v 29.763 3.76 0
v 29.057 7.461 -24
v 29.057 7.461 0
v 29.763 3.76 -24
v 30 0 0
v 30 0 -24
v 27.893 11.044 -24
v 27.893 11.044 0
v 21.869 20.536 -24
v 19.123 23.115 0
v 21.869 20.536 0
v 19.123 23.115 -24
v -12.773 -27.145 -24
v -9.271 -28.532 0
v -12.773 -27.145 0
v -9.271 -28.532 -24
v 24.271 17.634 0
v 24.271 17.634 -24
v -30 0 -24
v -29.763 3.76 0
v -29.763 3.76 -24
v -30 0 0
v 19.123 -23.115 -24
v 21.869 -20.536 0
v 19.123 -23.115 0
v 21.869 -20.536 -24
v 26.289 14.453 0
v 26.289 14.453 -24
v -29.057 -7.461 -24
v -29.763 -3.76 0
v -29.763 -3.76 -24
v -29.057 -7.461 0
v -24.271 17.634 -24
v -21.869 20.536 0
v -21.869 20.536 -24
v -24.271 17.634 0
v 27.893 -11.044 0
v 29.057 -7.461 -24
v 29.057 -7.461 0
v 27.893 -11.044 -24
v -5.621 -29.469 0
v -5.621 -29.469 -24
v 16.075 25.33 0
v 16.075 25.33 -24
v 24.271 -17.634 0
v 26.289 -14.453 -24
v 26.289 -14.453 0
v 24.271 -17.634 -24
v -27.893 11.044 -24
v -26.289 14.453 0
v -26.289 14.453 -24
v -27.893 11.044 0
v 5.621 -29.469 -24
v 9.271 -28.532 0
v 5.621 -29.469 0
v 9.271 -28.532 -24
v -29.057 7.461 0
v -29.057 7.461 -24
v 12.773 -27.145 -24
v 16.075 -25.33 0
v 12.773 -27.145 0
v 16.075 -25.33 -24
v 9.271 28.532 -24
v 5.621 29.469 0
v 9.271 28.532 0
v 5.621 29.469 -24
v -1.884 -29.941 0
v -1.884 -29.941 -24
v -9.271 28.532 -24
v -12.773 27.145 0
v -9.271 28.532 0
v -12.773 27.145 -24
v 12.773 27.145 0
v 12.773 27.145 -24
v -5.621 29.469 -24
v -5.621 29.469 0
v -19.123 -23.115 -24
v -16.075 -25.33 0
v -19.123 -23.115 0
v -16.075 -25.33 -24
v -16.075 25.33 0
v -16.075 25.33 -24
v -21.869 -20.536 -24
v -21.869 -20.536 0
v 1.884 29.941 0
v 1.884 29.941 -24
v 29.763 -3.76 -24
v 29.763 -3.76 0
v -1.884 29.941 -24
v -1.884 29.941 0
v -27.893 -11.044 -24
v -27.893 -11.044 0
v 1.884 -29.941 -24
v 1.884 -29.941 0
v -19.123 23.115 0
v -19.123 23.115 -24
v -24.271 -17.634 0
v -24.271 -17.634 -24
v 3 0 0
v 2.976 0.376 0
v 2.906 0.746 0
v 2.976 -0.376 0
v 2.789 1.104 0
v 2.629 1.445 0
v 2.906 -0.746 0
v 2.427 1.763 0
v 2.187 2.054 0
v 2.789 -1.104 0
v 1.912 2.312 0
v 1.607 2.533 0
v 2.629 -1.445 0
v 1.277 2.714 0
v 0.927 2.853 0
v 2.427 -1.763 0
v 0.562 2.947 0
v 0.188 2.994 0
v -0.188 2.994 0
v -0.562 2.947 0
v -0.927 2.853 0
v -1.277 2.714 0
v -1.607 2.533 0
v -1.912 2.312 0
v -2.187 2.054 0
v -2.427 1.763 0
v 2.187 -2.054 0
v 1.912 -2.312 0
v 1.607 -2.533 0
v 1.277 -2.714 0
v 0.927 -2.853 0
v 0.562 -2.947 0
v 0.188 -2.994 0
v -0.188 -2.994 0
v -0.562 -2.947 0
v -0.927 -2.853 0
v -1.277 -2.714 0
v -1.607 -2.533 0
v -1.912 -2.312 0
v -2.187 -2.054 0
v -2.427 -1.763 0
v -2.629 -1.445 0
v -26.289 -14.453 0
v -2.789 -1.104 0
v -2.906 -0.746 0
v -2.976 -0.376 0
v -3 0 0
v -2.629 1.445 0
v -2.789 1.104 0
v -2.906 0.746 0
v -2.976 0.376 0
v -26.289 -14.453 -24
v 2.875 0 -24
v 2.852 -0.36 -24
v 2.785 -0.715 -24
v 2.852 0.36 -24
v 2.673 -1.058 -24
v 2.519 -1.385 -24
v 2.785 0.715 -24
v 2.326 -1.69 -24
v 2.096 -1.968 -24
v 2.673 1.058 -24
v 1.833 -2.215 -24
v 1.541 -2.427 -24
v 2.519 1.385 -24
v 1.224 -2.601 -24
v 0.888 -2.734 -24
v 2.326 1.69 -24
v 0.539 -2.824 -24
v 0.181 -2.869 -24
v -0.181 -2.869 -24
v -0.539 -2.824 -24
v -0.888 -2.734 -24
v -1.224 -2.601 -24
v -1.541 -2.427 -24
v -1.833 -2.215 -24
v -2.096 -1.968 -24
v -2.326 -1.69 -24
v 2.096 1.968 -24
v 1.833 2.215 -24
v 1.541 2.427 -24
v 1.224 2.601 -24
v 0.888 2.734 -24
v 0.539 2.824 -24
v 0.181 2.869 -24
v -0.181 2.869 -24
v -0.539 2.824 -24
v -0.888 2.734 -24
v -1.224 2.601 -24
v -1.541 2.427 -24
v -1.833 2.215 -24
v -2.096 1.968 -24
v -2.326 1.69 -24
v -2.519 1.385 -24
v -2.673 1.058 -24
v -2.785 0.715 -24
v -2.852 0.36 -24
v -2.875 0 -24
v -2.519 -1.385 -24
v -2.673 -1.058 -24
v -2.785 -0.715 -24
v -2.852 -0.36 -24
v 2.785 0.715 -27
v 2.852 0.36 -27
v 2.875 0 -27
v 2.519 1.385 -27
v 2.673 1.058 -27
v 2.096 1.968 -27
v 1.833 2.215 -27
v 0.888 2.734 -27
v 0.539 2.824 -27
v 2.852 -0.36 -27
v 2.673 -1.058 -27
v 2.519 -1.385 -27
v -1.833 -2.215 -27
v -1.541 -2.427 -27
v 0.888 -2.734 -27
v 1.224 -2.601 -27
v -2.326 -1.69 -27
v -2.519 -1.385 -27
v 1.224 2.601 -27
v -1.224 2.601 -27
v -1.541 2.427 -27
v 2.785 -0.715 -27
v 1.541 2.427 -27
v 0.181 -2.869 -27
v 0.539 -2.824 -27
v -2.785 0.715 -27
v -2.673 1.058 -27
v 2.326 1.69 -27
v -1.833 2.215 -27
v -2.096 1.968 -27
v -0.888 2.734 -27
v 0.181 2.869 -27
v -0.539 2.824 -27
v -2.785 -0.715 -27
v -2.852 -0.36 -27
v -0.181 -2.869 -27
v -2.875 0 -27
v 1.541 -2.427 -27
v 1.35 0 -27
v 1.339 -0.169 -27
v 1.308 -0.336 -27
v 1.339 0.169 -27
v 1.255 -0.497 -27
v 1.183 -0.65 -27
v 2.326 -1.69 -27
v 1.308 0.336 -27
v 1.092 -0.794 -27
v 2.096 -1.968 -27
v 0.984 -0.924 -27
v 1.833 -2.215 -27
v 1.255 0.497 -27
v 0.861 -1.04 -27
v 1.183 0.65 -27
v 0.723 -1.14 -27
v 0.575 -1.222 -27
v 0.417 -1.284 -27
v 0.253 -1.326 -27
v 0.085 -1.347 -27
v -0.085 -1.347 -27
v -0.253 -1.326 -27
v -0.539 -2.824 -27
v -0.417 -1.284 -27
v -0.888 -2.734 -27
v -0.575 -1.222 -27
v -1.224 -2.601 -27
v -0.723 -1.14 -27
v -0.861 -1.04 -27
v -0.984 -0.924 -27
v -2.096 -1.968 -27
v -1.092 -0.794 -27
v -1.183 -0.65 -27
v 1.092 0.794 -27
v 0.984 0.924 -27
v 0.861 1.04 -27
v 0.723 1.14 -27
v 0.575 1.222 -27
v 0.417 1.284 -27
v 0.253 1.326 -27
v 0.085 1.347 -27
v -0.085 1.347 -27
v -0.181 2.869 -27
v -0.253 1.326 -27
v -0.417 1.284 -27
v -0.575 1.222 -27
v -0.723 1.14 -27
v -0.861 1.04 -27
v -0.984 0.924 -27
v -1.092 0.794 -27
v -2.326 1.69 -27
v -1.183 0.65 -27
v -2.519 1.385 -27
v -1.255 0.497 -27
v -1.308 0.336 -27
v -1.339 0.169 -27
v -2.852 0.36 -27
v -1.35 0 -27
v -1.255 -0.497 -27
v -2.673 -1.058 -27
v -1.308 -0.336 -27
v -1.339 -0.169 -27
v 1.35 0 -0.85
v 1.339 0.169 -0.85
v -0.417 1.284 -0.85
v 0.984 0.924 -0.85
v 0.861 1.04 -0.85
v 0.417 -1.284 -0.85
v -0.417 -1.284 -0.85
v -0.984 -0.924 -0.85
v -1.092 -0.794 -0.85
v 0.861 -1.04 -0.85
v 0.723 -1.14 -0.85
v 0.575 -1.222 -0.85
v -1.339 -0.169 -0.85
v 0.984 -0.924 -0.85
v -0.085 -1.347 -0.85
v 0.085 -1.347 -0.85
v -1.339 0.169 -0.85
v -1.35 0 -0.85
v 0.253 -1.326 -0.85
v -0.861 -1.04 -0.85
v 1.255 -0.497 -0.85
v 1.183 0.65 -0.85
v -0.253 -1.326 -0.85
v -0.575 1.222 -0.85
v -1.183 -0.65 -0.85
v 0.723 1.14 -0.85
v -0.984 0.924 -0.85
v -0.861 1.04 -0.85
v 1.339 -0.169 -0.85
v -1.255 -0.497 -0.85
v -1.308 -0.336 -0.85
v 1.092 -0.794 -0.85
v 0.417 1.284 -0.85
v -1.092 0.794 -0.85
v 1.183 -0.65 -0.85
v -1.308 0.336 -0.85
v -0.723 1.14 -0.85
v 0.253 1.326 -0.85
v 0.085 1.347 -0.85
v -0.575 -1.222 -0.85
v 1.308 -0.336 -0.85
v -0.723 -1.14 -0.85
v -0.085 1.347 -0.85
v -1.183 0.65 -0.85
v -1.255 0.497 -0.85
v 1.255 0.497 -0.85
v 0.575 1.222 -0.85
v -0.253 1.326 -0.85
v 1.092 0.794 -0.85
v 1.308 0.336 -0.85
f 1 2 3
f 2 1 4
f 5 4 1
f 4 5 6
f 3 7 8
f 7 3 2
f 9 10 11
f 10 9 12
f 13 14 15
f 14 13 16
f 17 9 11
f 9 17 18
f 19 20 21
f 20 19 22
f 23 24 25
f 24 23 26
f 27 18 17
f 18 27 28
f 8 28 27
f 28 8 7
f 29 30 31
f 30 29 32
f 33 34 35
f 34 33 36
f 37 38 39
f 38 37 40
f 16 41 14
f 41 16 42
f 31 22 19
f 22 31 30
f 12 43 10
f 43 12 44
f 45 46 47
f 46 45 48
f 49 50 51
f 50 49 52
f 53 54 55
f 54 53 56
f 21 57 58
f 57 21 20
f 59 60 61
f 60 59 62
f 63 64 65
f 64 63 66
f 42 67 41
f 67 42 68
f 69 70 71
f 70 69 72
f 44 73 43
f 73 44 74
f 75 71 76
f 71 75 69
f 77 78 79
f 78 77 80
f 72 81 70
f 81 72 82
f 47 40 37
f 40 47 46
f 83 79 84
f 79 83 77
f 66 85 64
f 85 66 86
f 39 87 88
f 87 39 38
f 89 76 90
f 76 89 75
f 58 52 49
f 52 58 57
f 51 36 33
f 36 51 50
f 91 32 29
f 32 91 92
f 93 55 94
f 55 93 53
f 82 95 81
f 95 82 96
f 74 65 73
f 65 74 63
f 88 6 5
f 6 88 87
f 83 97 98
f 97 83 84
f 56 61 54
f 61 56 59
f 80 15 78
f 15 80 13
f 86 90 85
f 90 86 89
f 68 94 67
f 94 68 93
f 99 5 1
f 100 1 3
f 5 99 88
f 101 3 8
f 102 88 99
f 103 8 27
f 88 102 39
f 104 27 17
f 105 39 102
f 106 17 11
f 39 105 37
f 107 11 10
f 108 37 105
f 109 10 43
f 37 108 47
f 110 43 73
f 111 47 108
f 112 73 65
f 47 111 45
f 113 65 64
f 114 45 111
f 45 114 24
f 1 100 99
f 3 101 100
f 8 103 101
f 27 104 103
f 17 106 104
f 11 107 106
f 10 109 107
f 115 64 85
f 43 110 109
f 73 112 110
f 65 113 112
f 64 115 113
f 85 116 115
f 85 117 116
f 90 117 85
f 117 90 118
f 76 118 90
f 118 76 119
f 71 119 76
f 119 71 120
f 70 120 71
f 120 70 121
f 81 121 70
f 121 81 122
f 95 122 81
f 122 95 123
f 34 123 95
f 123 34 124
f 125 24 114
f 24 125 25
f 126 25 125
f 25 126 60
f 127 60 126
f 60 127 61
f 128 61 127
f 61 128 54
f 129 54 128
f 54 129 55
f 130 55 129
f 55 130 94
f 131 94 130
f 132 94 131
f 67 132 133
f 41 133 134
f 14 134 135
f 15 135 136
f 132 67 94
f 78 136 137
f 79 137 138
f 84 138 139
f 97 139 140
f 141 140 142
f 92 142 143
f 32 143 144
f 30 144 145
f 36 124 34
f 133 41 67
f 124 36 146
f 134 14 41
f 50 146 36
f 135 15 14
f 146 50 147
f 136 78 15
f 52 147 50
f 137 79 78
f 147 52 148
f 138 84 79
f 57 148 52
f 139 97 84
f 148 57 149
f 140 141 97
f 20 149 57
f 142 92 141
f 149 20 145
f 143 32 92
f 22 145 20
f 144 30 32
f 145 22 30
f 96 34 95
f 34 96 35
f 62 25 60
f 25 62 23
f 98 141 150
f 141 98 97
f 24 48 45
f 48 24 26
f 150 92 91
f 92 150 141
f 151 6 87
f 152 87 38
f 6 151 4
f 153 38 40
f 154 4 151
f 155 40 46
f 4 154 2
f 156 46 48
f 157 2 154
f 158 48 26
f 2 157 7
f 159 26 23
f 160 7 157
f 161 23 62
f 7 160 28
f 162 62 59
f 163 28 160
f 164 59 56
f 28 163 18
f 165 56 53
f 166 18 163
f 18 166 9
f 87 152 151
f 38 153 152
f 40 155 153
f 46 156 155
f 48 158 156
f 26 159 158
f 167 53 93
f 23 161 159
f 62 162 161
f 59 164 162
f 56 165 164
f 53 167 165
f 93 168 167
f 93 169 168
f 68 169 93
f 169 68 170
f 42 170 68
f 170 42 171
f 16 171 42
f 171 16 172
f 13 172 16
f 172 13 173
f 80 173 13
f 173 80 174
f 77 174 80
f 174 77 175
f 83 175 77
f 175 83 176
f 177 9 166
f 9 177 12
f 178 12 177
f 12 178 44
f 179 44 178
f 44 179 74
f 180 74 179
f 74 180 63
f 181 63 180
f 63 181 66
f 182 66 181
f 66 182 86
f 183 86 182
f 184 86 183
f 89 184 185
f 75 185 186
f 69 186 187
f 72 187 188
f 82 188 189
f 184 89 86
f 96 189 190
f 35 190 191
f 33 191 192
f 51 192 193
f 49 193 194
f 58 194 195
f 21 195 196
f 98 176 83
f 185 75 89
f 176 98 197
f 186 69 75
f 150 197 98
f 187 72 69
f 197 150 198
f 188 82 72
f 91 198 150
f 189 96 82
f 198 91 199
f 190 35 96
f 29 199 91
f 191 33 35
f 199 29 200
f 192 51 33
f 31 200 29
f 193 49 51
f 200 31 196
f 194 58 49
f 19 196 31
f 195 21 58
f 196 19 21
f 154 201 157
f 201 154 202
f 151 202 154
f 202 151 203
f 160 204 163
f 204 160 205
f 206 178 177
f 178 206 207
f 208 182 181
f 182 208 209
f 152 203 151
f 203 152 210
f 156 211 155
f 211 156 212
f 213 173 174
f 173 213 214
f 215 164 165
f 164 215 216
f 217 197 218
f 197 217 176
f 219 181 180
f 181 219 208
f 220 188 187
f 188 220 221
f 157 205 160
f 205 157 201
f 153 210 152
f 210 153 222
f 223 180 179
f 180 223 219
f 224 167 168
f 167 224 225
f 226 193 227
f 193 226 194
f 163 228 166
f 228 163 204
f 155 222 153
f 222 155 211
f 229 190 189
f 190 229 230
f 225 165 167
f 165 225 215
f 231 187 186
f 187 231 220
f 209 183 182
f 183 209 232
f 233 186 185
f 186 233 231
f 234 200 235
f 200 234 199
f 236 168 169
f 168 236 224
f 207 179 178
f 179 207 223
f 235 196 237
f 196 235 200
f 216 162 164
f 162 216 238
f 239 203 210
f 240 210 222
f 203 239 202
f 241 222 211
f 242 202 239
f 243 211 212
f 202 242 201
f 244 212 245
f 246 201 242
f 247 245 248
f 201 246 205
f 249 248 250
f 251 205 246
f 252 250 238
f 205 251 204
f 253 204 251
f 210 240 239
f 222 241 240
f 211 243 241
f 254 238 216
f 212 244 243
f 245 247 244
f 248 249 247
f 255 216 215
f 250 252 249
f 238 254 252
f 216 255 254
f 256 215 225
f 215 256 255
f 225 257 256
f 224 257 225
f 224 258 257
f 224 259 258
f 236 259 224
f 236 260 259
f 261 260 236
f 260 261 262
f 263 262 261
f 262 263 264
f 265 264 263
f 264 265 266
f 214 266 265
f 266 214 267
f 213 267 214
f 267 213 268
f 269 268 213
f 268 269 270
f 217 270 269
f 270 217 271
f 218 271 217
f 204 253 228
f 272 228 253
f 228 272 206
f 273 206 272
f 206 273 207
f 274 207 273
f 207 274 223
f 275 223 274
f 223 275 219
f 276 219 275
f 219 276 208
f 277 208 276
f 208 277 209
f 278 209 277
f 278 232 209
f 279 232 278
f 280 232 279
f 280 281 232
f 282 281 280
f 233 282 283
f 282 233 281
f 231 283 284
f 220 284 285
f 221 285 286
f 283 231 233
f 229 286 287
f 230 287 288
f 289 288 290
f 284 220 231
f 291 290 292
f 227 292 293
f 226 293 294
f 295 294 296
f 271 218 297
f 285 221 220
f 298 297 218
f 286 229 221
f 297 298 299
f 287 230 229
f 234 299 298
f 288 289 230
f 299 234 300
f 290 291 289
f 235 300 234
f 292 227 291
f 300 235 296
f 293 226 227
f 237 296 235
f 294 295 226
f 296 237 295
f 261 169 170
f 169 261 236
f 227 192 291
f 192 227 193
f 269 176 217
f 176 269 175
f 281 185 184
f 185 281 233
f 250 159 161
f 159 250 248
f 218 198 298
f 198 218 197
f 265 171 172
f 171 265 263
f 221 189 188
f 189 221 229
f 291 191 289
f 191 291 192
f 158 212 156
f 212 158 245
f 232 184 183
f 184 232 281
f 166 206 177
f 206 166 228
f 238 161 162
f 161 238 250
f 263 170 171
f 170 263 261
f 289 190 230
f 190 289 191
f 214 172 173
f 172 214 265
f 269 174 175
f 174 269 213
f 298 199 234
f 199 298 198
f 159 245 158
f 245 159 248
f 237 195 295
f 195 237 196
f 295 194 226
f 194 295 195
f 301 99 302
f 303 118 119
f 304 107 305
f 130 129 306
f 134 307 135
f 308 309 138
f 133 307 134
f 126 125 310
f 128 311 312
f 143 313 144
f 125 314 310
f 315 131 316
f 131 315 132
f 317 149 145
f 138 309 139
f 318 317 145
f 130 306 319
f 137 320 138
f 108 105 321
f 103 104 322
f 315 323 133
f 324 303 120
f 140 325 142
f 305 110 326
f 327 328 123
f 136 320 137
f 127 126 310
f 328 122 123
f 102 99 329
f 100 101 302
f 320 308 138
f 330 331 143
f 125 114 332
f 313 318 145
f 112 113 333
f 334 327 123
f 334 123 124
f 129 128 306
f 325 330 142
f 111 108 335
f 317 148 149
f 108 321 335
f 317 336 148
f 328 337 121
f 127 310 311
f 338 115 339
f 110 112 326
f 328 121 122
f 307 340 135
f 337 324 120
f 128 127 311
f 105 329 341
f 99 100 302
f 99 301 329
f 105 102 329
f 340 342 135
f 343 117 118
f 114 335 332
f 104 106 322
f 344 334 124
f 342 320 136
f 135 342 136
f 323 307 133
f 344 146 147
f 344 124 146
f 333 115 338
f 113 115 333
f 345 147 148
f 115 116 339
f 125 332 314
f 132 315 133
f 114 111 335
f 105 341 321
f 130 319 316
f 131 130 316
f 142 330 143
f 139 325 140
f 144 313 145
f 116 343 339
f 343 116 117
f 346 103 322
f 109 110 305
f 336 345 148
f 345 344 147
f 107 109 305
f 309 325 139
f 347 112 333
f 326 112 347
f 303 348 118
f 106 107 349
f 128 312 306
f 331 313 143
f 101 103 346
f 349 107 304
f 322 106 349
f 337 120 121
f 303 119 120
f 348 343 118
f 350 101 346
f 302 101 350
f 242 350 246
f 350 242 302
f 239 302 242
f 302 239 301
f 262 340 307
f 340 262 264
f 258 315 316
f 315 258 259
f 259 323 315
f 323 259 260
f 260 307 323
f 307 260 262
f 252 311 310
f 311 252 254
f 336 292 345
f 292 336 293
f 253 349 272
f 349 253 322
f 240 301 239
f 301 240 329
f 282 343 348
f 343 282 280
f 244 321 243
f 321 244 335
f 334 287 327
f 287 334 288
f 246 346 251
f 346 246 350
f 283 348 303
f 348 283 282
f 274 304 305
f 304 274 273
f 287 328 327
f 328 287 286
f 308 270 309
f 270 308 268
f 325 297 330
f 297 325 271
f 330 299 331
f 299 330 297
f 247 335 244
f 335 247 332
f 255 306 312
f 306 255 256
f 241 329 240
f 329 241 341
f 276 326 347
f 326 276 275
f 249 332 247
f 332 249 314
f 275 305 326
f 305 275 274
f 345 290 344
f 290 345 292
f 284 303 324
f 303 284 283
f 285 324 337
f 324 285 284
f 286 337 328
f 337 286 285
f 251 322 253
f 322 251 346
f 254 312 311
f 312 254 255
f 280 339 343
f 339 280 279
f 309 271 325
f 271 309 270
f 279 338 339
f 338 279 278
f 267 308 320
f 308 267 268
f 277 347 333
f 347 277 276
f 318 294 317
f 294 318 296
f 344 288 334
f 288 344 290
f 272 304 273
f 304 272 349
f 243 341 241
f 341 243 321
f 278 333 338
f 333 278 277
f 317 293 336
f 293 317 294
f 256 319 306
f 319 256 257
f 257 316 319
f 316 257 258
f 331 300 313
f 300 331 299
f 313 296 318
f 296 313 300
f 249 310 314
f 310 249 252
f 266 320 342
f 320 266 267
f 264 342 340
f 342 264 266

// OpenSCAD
$fn = 50;

difference() {
	union() {
		translate(v = [0, 0, -24.0]) {
			cylinder(h = 24, r = 30.0);
		}
		#translate(v = [0, 0, -27.0]) {
			cylinder(h = 27, r = 2.875);
		}
	}
	union() {
		translate(v = [0, 0, 0]) {
			rotate(a = [0, 0, 0]) {
				difference() {
					union() {
						translate(v = [0, 0, -27.0]) {
							cylinder(h = 27, r = 1.0);
						}
						translate(v = [0, 0, -0.85]) {
							cylinder(h = 0.85, r1 = 1.35, r2 = 3.0);
						}
						translate(v = [0, 0, -27.0]) {
							cylinder(h = 27, r = 1.35);
						}
						translate(v = [0, 0, -27.0]) {
							cylinder(h = 27, r = 1.0);
						}
					}
					union();
				}
			}
		}
	}
}
